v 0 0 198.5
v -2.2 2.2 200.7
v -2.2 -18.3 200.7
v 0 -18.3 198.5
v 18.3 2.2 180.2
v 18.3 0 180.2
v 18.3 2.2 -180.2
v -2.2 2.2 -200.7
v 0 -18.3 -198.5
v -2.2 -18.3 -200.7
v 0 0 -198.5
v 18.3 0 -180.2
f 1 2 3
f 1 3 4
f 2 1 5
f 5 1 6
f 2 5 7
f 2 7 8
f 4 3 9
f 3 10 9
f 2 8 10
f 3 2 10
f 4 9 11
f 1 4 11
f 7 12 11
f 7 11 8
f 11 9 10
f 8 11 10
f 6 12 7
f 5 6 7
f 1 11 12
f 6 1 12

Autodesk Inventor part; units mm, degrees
ref_plane "YZ Plane" through (0, 0, 0) normal (1, 0, 0) x (0, 1, 0)
ref_plane "XZ Plane" through (0, 0, 0) normal (0, 1, 0) x (-1, 0, 0)
ref_plane "XY Plane" through (0, 0, 0) normal (0, 0, 1) x (1, 0, 0)
sketch "Esquisse1" plane through (0, 0, 0) normal (0, 0, 1) x (1, 0, 0)
  line L0 (0, 0) -> (18.3, 0)
  line L1 (18.3, 0) -> (18.3, 2.2)
  line L2 (18.3, 2.2) -> (-2.2, 2.2)
  line L3 (-2.2, 2.2) -> (-2.2, -18.3)
  line L4 (-2.2, -18.3) -> (0, -18.3)
  line L5 (0, -18.3) -> (0, 0)
  dimension "Epaisseur_cornière" = 2.2
  dimension "Largueur" = 20.5
extrude "Embase" add sketch "Esquisse1" along normal mid plane 401.4
sketch "Esquisse2" plane through (0, 0, 0) normal (0, 1, 0) x (-1, 0, 0)
  line L0 (2.2, 200.7) -> (-18.3, 180.2)
  line L1 (-18.3, 180.2) -> (-18.3, 200.7)
  line L2 (-18.3, 200.7) -> (2.2, 200.7)
  line L3 (-18.3, 200.7) -> (2.2, 200.7) construction
  line L4 (2.2, -200.7) -> (2.2, 200.7) construction
  line L5 (-18.3, -200.7) -> (-18.3, 200.7) construction
  point P0 (0, 0)
  dimension "d4" = 45
extrude "Découpe à 45" cut sketch "Esquisse2" along normal through all both and the other way through all
mirror "Symétrie découpe" about plane through (0, 0, 0) normal (0, 0, 1) of "Découpe à 45"
properties part number "Profilé superieur face" material "Aluminium 6061"
